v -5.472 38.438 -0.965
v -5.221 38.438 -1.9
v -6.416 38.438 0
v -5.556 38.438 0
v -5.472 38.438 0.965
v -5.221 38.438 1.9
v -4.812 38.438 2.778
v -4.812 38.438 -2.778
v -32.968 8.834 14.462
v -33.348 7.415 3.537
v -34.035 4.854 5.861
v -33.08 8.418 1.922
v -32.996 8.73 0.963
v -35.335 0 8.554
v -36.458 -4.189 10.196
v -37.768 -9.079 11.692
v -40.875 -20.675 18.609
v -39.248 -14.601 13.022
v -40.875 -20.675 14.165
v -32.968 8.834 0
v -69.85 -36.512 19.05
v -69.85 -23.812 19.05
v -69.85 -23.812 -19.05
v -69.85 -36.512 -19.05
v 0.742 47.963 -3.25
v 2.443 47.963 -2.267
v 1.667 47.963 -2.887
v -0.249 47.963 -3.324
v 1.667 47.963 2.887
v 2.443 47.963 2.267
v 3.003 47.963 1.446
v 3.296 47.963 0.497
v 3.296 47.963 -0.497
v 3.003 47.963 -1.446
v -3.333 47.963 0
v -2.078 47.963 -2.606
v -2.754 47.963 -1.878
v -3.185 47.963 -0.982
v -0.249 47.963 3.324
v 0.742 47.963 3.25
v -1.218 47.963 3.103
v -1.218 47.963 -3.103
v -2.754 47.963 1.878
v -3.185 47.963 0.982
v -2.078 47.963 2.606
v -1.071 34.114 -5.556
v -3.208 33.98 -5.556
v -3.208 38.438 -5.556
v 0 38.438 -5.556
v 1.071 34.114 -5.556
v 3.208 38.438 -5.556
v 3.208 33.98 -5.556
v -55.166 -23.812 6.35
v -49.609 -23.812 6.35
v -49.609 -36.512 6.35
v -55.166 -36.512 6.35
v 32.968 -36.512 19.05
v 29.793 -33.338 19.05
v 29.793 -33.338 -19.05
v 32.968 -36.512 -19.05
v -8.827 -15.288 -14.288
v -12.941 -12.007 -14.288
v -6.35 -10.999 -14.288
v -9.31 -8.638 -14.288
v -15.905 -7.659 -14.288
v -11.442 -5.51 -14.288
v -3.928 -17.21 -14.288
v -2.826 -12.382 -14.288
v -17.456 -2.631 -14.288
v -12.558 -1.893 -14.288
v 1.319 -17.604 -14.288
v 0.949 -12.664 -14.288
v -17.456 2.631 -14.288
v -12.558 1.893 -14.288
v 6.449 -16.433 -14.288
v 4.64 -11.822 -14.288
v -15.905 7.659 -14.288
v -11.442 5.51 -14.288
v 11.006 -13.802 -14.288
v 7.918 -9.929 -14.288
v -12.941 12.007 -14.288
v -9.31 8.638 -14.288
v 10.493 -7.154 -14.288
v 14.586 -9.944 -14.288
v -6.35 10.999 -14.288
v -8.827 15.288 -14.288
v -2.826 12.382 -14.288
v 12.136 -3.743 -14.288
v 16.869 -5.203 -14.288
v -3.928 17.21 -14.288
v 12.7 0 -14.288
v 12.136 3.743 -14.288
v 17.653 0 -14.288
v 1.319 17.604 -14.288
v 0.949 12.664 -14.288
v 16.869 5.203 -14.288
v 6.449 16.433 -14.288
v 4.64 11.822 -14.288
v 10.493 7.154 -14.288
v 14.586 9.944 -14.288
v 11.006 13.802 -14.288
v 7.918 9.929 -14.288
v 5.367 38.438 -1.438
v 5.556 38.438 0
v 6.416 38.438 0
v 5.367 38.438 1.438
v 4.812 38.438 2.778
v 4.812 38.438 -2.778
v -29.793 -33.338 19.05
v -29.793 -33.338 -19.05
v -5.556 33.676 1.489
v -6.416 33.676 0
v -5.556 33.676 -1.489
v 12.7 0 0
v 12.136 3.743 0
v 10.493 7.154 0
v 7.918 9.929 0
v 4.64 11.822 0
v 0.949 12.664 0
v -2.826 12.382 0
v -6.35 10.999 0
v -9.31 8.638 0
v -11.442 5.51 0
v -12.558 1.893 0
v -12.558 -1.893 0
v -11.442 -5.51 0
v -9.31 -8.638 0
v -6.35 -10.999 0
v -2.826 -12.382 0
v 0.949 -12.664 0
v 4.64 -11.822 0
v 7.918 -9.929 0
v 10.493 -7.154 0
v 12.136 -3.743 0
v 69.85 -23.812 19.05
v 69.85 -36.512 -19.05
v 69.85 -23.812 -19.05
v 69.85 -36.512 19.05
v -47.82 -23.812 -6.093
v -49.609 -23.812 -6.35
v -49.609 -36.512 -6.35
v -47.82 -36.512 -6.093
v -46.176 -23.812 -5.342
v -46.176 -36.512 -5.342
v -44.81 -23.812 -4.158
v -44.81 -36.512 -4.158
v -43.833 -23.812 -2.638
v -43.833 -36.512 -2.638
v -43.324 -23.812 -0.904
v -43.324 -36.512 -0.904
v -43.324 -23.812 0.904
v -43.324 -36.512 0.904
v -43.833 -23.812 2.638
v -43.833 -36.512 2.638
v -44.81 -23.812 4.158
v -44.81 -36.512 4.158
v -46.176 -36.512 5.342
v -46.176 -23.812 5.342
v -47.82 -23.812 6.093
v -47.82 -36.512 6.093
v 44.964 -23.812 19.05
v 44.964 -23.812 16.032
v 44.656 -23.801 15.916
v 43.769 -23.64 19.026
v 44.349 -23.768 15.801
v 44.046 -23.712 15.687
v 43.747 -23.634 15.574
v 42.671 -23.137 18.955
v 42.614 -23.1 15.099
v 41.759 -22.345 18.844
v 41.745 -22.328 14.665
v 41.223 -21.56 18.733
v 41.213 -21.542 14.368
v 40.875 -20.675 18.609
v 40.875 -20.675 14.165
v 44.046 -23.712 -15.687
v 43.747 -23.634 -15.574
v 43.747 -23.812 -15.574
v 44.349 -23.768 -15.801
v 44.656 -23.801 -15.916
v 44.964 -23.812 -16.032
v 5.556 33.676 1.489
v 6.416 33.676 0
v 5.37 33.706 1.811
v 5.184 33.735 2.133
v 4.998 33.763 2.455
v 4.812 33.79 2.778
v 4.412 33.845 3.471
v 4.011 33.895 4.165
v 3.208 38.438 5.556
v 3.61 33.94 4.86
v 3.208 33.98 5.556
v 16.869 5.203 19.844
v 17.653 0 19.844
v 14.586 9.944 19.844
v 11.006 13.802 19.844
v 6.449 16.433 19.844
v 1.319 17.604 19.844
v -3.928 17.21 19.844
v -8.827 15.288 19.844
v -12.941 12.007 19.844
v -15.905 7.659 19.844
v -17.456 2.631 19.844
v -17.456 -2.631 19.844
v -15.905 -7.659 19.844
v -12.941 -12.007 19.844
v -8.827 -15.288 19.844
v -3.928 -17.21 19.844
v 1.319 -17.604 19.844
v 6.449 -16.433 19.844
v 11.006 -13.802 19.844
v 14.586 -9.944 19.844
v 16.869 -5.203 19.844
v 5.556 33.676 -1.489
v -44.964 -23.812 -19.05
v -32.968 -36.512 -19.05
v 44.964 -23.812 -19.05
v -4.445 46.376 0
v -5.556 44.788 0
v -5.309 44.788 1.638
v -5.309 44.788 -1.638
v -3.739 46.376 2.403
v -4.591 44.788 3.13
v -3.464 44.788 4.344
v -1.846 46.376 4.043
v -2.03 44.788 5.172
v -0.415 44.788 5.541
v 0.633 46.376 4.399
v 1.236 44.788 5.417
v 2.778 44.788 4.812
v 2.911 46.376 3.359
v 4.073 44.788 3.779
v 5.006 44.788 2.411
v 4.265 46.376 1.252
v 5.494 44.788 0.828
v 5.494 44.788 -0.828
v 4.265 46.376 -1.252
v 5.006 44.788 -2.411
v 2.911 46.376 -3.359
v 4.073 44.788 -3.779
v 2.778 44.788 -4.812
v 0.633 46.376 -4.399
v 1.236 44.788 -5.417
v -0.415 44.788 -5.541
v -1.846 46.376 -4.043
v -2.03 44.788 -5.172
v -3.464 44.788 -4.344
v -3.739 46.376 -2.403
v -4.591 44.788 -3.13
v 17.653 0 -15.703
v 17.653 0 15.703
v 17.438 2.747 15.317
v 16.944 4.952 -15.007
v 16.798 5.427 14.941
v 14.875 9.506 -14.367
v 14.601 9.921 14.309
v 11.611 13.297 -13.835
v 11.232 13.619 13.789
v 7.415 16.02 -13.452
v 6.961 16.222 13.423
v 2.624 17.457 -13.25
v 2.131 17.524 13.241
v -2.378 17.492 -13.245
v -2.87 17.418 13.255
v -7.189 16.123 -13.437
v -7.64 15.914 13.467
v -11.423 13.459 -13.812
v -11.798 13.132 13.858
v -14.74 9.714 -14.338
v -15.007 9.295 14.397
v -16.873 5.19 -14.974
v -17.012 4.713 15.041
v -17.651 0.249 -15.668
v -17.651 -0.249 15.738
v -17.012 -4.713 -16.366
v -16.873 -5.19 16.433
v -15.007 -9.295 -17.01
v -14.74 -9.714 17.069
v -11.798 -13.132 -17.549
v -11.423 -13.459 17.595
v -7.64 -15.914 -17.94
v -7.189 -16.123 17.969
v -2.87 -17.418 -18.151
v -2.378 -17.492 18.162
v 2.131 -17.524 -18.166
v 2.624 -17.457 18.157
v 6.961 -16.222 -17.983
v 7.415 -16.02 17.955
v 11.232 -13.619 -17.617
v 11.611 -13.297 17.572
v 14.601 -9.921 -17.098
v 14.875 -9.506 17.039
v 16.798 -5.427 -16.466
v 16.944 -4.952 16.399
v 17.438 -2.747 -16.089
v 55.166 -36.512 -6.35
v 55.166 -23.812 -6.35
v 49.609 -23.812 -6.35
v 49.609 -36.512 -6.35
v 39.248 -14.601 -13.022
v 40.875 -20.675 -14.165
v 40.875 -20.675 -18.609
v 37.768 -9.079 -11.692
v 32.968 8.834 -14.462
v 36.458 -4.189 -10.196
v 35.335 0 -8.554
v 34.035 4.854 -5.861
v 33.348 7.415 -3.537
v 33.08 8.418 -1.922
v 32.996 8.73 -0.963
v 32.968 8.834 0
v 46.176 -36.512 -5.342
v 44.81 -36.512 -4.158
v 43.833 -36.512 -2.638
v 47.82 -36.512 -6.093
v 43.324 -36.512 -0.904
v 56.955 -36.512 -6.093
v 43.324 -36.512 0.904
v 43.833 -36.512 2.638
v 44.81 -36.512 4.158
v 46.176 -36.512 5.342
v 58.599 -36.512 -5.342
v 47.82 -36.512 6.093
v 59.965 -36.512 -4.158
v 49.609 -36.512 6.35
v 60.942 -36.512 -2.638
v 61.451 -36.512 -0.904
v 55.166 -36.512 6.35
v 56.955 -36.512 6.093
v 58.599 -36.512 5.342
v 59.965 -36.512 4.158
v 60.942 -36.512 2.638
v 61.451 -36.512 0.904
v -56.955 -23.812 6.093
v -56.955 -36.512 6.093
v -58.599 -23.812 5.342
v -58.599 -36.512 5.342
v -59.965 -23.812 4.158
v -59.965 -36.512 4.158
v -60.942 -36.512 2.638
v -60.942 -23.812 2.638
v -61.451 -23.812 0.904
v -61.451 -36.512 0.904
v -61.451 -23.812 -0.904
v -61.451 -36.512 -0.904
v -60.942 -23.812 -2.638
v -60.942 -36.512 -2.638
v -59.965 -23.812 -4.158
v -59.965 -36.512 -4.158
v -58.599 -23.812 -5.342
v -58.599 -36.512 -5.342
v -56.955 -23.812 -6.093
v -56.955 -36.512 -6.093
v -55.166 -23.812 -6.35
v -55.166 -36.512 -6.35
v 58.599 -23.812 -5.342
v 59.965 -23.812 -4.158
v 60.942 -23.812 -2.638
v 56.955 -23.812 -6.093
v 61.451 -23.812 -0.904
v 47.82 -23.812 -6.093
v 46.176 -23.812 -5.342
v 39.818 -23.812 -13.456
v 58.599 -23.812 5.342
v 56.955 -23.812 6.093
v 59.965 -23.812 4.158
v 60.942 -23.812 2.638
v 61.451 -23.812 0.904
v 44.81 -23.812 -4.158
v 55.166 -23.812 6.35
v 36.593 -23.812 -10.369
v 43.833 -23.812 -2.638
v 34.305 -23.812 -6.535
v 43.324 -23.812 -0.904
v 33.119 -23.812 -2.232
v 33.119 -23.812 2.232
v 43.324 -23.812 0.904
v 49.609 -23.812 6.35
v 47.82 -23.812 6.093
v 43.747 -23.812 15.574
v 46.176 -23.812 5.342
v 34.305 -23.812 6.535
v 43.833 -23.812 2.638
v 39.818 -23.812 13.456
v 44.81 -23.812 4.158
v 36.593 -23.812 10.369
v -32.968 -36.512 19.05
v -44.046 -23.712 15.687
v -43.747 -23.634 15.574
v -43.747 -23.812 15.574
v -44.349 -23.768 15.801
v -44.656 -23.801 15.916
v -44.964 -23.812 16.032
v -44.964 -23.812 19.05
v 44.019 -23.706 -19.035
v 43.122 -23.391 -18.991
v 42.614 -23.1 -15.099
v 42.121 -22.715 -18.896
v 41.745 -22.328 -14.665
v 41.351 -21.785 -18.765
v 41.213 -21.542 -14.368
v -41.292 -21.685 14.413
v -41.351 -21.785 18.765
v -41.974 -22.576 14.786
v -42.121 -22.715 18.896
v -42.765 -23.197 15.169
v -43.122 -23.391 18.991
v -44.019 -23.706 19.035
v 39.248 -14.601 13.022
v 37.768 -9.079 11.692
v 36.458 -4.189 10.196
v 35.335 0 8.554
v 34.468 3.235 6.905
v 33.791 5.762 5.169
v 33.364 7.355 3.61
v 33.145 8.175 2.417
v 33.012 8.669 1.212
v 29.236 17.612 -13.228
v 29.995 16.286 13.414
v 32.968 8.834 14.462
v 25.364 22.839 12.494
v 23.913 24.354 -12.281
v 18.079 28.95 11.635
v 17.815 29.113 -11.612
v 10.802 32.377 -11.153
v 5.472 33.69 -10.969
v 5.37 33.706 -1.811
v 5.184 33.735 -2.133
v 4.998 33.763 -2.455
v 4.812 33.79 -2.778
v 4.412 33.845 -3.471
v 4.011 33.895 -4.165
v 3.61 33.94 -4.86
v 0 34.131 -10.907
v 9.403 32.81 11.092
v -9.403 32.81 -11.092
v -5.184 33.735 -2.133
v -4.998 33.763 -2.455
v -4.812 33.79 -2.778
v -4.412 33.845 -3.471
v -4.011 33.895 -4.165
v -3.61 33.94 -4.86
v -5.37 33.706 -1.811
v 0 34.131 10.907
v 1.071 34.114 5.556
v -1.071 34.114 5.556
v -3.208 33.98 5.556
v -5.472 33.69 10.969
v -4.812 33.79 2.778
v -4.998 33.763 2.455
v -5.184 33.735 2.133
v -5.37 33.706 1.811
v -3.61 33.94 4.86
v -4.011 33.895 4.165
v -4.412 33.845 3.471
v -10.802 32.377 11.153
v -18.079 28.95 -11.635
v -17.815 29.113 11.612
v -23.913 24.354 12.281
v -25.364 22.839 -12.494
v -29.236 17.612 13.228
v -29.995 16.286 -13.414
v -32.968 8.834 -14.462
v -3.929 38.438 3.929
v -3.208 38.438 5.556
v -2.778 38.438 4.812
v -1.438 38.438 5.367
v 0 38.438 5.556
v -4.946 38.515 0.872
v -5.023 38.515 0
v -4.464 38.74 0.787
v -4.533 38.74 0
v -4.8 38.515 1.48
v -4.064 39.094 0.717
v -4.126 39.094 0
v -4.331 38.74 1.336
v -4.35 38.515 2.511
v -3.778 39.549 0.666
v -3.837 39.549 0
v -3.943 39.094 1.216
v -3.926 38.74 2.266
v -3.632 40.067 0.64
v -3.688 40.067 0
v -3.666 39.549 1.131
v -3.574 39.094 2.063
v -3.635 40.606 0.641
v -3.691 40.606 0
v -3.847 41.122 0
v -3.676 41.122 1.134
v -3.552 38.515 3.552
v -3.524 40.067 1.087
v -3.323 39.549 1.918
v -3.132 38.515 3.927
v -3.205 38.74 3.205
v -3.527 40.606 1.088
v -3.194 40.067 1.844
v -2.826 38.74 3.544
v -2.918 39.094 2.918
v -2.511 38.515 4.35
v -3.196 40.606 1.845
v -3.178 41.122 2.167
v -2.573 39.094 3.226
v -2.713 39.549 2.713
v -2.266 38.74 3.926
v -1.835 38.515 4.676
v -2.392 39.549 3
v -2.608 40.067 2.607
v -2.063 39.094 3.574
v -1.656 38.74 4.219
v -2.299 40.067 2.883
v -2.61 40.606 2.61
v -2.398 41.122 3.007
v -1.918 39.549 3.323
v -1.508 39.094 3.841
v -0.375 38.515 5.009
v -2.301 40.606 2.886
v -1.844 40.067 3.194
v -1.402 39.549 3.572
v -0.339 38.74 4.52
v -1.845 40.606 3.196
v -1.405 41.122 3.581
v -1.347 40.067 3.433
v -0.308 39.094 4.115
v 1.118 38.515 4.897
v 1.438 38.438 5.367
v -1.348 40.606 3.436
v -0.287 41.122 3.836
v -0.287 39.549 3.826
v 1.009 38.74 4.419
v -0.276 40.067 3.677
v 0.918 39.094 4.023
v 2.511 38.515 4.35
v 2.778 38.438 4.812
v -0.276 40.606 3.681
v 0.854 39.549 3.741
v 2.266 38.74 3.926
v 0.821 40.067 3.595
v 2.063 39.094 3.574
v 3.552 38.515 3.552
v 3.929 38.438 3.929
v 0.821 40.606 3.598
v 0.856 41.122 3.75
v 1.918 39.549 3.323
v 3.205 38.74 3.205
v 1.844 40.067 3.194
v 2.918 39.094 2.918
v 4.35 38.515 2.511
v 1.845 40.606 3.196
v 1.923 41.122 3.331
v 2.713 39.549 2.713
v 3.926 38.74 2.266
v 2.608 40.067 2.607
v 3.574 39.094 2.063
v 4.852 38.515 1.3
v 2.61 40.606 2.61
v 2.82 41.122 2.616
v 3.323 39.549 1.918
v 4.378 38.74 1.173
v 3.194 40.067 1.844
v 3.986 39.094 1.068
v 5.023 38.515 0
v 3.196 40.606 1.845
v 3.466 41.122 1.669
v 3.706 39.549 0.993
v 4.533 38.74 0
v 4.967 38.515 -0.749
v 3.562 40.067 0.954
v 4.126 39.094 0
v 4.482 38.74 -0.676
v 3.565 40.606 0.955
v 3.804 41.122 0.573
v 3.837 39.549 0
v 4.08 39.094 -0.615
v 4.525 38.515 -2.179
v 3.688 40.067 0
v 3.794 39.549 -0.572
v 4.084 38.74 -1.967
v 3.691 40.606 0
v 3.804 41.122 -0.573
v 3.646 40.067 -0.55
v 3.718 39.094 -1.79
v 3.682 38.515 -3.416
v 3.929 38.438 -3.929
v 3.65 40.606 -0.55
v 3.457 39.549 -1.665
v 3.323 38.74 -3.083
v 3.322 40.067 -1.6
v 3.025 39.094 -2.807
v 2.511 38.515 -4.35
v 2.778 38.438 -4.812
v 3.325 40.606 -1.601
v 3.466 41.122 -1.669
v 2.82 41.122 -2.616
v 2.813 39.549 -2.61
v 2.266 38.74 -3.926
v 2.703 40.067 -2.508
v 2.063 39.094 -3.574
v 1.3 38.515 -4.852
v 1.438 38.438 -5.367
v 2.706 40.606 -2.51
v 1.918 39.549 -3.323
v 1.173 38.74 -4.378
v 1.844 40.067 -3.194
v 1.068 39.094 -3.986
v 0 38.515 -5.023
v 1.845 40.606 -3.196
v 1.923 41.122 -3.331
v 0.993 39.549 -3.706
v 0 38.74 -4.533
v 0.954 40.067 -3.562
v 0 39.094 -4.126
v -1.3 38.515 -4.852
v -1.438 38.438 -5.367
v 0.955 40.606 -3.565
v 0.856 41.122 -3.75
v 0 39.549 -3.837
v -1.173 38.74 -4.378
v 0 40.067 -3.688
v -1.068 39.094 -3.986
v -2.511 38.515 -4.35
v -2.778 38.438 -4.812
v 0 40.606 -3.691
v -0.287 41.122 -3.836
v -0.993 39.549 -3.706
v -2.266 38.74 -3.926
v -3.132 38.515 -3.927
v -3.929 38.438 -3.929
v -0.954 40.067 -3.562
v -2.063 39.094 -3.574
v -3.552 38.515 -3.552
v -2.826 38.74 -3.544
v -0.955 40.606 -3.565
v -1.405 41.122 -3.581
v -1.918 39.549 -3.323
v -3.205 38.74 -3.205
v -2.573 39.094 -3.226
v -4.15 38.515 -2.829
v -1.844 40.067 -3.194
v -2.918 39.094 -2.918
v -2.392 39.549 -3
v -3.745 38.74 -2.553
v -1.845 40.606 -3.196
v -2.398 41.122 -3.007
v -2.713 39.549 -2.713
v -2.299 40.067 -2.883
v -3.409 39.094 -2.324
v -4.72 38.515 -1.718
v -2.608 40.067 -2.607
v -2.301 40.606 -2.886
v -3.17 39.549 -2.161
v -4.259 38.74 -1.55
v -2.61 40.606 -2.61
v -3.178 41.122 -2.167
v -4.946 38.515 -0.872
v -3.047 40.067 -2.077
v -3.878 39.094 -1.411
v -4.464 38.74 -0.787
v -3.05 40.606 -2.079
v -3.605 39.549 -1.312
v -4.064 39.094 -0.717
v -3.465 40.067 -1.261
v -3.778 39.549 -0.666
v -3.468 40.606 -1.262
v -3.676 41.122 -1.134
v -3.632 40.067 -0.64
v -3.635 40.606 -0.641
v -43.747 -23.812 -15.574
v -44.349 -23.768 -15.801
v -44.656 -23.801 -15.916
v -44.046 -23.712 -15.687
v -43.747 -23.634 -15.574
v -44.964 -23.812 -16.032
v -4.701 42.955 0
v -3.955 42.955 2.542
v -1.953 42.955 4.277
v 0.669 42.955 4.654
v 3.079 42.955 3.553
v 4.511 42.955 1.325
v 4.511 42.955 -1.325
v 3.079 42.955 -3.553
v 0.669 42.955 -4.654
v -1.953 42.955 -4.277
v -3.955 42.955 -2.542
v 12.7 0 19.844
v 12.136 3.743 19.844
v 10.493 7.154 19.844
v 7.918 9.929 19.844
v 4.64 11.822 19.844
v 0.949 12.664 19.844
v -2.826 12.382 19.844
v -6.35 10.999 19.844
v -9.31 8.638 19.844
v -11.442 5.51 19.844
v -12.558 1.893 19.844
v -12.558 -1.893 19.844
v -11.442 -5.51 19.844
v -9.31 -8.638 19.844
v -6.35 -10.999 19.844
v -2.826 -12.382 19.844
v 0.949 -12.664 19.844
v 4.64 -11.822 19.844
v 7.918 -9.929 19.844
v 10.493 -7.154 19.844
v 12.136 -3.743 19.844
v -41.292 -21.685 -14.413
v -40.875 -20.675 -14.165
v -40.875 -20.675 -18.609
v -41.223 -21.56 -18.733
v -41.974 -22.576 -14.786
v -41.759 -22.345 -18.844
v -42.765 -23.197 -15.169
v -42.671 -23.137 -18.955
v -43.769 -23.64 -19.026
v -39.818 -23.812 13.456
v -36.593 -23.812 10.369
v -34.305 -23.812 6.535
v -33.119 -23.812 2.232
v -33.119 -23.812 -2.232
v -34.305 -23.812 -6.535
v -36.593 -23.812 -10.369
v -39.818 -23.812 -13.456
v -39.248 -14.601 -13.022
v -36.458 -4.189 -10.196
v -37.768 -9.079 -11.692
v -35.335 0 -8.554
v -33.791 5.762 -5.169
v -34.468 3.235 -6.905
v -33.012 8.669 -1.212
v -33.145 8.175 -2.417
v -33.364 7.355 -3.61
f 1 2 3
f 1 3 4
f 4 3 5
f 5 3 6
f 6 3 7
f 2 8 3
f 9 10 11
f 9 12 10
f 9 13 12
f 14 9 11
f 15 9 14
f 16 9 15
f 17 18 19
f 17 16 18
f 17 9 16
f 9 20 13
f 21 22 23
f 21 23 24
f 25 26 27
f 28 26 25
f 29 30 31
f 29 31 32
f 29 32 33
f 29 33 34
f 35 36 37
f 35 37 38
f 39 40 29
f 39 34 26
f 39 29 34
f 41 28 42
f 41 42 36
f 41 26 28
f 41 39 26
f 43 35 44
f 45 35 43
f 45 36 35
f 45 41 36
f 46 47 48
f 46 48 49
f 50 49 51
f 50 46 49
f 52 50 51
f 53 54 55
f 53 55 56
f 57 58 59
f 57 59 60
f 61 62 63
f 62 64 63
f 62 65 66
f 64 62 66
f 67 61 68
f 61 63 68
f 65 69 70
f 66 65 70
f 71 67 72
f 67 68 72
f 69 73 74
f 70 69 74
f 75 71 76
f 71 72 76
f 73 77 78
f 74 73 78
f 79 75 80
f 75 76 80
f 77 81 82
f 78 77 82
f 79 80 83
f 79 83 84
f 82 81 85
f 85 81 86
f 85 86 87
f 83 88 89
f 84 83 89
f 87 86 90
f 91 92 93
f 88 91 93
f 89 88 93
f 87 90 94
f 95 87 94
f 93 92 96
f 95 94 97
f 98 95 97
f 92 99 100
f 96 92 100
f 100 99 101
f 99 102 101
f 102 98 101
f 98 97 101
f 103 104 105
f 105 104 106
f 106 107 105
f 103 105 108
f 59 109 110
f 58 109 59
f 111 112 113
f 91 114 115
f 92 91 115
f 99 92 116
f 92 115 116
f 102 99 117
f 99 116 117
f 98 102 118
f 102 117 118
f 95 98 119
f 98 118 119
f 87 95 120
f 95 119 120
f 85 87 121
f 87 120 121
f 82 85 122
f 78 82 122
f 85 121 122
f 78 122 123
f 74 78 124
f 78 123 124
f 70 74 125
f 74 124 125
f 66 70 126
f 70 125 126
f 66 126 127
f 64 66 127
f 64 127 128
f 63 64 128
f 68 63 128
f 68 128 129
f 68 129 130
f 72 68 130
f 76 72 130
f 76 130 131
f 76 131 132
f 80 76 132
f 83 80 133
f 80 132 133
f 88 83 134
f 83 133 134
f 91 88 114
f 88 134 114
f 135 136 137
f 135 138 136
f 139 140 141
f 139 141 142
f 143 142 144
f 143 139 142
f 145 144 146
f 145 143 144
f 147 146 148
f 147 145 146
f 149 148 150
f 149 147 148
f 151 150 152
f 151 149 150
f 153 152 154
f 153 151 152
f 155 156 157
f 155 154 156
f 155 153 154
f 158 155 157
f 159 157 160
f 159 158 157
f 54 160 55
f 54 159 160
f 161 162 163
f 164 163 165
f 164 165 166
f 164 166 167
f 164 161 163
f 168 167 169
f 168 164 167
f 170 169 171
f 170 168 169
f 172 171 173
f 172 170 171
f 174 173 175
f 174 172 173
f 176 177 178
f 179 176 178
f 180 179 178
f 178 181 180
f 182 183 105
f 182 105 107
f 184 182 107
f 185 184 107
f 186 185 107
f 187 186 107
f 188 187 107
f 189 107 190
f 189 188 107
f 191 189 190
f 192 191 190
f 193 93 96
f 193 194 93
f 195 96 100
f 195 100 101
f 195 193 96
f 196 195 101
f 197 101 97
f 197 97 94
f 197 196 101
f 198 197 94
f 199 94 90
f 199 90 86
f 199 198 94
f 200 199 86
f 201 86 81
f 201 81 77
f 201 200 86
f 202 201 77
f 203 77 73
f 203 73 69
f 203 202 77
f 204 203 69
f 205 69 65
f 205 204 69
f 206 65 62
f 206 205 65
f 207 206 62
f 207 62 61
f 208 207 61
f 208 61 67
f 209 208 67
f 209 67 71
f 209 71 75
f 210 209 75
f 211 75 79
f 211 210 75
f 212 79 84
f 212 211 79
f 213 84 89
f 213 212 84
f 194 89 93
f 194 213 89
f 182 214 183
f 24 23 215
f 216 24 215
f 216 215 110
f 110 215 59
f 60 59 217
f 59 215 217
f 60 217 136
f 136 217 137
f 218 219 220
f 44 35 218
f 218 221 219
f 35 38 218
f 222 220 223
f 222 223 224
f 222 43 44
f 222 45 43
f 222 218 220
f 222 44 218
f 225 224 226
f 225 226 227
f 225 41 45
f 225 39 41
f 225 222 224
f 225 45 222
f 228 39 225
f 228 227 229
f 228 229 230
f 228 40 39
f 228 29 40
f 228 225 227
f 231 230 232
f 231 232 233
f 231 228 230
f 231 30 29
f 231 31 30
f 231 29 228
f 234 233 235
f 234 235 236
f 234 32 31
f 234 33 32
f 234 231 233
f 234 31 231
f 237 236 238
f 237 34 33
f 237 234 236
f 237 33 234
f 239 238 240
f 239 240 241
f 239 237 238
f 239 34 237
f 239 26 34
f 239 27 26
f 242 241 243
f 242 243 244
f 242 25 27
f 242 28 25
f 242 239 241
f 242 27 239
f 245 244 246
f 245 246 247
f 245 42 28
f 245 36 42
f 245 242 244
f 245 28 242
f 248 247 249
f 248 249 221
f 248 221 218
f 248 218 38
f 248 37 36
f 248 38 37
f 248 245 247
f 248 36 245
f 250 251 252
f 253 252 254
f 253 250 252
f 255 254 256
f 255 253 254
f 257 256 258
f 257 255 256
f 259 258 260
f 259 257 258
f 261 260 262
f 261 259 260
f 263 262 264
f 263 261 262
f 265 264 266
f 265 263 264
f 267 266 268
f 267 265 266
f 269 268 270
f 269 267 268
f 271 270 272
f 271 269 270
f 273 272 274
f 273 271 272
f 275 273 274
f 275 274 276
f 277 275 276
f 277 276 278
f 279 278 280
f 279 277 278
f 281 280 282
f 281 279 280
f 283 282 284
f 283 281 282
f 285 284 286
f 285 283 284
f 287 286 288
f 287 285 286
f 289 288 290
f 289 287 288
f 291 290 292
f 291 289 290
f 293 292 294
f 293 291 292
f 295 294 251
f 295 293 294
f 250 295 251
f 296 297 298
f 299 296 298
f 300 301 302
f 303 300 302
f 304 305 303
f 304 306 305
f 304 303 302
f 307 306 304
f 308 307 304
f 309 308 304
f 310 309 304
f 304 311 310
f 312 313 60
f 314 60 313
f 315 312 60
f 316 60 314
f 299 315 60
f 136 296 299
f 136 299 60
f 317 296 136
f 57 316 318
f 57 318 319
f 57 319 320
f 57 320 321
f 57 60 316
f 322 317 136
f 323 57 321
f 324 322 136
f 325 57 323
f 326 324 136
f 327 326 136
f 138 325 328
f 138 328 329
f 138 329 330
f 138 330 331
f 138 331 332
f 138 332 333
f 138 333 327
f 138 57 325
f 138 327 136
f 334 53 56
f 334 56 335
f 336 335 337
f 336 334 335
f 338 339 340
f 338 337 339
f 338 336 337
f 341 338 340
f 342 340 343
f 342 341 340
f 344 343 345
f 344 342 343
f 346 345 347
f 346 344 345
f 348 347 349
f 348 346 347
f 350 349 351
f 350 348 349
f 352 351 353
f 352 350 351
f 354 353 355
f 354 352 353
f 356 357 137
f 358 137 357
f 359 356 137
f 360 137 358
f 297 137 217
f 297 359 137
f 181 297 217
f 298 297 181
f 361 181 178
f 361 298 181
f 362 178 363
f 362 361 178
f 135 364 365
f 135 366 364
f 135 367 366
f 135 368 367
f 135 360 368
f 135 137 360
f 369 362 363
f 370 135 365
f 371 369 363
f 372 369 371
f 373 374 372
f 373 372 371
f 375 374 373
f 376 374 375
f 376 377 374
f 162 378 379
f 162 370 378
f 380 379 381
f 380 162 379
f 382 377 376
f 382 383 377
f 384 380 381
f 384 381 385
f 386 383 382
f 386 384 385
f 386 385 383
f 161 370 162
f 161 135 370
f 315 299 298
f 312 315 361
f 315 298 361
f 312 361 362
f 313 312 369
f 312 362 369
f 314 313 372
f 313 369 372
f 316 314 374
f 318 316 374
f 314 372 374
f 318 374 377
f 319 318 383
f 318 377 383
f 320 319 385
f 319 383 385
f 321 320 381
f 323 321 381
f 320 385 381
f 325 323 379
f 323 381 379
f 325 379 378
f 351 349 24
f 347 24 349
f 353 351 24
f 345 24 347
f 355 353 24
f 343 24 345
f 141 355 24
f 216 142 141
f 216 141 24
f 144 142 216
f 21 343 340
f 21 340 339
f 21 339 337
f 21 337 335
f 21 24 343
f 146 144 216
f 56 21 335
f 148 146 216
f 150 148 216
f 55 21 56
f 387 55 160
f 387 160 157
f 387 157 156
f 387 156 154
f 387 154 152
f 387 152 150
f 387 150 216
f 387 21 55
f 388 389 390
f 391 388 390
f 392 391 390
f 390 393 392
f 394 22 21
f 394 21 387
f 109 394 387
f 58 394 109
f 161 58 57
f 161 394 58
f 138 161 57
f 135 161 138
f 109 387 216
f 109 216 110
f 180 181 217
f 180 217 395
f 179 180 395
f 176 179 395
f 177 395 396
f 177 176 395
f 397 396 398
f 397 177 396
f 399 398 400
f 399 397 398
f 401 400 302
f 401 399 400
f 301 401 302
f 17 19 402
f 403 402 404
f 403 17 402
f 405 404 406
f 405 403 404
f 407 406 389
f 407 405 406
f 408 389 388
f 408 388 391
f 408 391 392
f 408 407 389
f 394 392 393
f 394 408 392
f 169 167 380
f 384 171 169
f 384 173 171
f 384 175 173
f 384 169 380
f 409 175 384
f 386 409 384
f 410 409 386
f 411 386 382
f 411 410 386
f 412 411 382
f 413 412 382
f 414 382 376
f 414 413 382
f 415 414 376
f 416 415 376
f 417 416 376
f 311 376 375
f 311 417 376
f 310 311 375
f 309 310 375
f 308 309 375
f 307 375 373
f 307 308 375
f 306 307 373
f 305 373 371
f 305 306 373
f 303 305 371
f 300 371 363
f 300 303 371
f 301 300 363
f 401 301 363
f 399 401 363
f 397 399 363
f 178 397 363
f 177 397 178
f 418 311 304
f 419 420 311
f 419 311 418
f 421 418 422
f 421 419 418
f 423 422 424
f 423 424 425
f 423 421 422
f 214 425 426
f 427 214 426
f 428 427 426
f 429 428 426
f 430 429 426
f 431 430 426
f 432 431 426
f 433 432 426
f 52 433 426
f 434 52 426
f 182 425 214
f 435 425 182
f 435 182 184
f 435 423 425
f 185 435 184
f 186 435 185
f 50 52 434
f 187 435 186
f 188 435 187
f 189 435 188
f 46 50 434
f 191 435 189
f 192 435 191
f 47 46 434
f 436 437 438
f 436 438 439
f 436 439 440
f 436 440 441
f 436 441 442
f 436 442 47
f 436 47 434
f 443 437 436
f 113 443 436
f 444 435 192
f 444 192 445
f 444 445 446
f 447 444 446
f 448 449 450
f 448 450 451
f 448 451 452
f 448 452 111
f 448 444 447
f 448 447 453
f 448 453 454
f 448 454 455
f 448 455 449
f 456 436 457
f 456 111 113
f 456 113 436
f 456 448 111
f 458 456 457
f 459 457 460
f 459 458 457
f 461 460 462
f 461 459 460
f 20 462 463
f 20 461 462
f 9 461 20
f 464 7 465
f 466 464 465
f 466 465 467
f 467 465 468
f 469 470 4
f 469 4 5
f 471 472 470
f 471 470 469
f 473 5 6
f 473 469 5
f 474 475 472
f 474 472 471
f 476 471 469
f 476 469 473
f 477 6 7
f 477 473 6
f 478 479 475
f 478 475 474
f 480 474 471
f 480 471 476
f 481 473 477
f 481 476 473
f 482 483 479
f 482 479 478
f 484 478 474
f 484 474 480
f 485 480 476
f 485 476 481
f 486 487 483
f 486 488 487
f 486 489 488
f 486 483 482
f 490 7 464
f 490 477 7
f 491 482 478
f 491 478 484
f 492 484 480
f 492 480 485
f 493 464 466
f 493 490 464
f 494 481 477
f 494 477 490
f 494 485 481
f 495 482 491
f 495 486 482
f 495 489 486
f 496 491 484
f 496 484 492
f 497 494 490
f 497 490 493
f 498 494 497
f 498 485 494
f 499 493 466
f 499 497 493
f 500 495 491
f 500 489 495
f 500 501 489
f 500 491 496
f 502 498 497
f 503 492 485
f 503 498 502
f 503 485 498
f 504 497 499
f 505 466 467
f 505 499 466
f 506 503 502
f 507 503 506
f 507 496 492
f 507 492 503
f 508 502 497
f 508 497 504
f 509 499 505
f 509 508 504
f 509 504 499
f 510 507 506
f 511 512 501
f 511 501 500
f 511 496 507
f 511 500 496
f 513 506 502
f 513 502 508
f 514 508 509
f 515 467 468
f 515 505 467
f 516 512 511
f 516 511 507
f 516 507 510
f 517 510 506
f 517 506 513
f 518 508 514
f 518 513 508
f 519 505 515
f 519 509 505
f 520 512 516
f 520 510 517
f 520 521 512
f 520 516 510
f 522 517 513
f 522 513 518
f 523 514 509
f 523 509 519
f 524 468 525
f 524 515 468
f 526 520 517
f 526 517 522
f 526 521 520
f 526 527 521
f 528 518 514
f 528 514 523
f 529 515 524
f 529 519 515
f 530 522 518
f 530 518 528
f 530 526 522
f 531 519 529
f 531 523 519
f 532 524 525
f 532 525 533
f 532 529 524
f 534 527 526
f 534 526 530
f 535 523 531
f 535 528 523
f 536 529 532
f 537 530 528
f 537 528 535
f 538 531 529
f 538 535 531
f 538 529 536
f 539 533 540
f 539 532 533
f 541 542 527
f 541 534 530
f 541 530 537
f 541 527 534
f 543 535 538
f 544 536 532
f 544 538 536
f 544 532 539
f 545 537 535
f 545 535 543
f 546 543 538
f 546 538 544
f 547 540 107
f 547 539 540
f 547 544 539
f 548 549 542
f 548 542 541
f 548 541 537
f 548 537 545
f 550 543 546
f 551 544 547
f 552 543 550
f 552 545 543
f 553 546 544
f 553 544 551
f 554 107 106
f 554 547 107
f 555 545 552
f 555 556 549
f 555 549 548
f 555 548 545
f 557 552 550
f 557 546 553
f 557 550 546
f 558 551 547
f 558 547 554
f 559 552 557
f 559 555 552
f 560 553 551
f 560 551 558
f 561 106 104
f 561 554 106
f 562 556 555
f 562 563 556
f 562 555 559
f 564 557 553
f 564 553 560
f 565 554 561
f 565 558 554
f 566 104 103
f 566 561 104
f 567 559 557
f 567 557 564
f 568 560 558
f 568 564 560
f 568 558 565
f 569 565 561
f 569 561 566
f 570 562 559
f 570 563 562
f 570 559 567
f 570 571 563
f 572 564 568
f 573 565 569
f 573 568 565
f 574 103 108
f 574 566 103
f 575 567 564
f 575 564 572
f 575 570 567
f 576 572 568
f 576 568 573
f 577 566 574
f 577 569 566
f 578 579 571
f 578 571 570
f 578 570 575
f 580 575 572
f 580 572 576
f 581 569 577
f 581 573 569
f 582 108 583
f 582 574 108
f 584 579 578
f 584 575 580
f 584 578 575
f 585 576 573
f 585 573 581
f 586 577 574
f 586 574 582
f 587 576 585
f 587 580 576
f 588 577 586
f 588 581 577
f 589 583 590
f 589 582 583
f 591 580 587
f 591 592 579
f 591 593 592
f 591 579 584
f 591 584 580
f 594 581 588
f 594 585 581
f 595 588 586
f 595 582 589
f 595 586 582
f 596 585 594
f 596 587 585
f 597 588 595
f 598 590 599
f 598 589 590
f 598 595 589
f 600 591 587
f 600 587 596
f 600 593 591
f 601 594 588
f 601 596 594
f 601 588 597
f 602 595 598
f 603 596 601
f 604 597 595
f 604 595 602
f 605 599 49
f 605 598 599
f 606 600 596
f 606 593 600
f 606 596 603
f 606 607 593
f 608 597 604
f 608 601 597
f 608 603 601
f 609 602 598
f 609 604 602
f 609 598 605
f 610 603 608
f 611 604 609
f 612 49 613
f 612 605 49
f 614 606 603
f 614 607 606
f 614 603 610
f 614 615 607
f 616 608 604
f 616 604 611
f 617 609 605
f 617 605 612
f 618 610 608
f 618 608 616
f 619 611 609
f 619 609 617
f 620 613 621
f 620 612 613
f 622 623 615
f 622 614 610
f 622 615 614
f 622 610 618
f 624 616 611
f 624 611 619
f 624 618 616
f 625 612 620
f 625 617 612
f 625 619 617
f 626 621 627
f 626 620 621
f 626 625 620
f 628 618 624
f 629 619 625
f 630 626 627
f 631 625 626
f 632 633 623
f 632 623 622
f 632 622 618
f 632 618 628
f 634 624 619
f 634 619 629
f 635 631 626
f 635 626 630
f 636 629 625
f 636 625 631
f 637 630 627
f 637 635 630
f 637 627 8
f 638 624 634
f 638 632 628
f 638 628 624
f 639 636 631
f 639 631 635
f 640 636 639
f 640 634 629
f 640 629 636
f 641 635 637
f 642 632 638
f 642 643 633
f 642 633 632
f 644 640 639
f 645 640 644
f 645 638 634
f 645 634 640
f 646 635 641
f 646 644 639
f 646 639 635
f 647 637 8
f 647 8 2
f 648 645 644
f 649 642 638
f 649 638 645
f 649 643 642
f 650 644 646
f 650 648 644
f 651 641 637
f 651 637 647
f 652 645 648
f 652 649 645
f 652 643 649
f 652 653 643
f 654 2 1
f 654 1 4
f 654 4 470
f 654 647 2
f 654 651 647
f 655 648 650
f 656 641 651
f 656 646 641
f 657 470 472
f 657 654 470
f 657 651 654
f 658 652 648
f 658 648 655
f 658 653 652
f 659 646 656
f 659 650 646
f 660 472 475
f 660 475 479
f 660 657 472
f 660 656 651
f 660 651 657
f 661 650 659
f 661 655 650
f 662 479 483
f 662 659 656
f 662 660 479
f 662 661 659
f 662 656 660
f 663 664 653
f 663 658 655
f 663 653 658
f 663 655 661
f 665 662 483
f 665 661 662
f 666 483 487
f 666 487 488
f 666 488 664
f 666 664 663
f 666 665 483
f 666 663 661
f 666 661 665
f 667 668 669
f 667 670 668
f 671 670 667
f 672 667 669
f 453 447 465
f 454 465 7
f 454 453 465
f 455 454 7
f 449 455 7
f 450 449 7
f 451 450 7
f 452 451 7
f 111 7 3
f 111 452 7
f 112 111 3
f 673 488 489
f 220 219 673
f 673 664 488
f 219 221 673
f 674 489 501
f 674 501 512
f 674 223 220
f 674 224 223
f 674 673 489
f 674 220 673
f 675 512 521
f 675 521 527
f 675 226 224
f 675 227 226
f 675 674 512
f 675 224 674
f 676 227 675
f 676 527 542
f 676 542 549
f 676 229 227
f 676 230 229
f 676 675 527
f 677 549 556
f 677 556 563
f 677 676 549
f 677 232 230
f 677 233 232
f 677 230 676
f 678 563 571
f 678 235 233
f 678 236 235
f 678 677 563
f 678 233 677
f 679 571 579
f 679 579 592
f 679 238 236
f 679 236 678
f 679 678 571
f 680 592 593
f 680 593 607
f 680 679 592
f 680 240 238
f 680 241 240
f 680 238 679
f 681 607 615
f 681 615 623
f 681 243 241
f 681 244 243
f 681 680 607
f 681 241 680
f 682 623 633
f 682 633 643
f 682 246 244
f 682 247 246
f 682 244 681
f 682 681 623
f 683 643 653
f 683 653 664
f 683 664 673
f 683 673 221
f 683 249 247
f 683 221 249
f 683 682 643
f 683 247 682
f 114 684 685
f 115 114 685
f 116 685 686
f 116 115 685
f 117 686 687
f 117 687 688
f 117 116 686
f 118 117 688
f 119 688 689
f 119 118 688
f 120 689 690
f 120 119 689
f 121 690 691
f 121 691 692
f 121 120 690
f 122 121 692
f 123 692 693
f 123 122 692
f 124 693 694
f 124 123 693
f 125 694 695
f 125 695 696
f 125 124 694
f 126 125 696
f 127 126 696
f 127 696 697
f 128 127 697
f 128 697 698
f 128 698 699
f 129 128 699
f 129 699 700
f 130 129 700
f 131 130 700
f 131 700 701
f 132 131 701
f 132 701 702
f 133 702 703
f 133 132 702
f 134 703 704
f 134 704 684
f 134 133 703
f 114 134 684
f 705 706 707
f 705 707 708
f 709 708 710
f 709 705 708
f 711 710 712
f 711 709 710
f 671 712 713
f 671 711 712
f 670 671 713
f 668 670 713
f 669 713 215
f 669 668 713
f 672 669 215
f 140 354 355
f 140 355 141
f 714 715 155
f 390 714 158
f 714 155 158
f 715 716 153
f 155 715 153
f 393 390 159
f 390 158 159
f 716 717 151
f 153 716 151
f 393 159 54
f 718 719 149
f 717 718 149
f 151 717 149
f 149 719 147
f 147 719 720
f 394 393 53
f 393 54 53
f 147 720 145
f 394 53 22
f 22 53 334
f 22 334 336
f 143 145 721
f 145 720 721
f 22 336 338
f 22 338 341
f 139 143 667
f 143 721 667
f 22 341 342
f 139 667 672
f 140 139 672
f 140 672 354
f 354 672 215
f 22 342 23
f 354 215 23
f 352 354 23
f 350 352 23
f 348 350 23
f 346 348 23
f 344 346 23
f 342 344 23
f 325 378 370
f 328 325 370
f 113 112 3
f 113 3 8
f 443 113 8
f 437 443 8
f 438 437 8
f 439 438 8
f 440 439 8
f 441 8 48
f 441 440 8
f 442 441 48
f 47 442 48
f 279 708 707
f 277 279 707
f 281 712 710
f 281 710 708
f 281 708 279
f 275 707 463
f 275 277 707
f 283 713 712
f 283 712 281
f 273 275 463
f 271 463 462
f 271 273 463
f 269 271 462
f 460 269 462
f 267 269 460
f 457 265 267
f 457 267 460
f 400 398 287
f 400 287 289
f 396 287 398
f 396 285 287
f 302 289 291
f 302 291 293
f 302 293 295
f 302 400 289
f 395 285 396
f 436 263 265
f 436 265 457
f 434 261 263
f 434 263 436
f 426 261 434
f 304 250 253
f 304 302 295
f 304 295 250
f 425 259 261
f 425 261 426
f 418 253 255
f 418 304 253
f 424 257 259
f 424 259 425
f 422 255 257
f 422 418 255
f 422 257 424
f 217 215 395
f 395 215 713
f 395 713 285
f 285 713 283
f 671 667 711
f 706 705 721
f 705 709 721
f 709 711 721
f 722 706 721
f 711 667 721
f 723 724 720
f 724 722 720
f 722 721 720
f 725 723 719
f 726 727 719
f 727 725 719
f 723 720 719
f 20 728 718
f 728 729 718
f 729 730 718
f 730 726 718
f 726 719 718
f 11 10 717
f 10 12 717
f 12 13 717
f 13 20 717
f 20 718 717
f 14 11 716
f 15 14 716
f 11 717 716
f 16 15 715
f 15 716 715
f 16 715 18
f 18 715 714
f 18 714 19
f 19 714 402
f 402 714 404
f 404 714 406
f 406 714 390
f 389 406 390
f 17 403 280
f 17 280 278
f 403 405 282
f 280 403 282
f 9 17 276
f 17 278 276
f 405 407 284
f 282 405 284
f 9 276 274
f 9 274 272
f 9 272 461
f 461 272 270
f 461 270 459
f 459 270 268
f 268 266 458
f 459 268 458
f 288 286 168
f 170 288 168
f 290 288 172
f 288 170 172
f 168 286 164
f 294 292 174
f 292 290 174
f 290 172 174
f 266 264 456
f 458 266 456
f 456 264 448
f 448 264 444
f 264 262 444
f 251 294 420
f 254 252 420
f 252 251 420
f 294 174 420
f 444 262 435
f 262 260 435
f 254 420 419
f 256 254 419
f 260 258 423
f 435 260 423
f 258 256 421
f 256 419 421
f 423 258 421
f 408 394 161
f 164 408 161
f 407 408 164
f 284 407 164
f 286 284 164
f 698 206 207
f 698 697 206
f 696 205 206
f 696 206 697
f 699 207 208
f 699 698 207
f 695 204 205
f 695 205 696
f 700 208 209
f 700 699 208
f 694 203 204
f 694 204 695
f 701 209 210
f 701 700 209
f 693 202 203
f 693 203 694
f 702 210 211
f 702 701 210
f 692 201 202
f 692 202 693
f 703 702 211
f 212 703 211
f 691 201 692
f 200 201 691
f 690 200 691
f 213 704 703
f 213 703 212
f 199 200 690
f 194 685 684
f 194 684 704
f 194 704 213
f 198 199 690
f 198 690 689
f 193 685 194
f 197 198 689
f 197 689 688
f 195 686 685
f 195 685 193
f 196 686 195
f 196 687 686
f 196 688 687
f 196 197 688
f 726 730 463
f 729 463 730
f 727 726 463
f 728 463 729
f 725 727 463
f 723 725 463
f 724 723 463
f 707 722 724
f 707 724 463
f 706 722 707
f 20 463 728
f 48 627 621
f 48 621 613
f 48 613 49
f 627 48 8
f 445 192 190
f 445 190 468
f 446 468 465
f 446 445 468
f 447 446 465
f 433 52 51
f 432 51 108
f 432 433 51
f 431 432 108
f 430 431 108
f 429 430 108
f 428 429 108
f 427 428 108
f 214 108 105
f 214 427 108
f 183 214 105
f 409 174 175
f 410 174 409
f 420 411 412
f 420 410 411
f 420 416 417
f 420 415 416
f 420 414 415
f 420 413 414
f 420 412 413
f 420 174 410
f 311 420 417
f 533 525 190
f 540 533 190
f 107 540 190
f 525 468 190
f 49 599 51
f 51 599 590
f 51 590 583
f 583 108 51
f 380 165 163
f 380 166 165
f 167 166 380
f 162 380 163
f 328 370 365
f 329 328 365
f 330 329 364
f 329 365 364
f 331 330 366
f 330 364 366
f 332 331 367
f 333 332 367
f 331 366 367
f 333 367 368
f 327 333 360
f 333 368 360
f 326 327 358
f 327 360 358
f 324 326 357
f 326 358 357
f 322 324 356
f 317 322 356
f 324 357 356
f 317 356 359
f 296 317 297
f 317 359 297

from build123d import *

# Parameters (mm, degrees)
SKETCH1_R               = 17.653
SKETCH1_R_2             = 12.7
EXTRUDE1_DEPTH          = 19.84375
EXTRUDE1_DEPTH_BACK     = 14.2875
SKETCH2_R               = 17.653
EXTRUDE2_DEPTH          = 19.05
CUT_EXTRUDE1_DEPTH      = 35.13125
CUT_EXTRUDE1_DEPTH_BACK = 37.5125
CUT_EXTRUDE2_DEPTH      = 35.13125
CUT_EXTRUDE2_DEPTH_BACK = 23.8125
CUT_EXTRUDE3_DEPTH      = 70.85
EXTRUDE3_DEPTH          = 4.7625


with BuildPart() as part:
    # Sketch1 → Extrude1 (new body, two sides)
    with BuildSketch(Plane.XY) as extrude1_sk:
        Circle(SKETCH1_R)
        Circle(SKETCH1_R_2, mode=Mode.SUBTRACT)
    extrude(amount=EXTRUDE1_DEPTH)
    extrude(extrude1_sk.sketch, amount=-EXTRUDE1_DEPTH_BACK)


with BuildPart() as body_2:
    # Sketch2 → Extrude2 (new body, symmetric)
    with BuildSketch(Plane.XY):
        with BuildLine():
            Line((-32.968255859, 8.833817533), (-40.875075195, -20.674833958))
            ThreePointArc((-40.875075195, -20.674833958), (-42.387071144, -22.937695807), (-44.964161193, -23.8125))
            Line((-44.964161193, -23.8125), (-69.85, -23.8125))
            Line((-69.85, -23.8125), (-69.85, -36.5125))
            Line((-69.85, -36.5125), (-32.968255859, -36.5125))
            Line((-32.968255859, -36.5125), (-29.793255859, -33.3375))
            Line((-29.793255859, -33.3375), (29.793255859, -33.3375))
            Line((29.793255859, -33.3375), (32.968255859, -36.5125))
            Line((32.968255859, -36.5125), (69.85, -36.5125))
            Line((69.85, -36.5125), (69.85, -23.8125))
            Line((69.85, -23.8125), (44.964161193, -23.8125))
            ThreePointArc((44.964161193, -23.8125), (42.387071144, -22.937695807), (40.875075195, -20.674833958))
            Line((40.875075195, -20.674833958), (32.968255859, 8.833817533))
            ThreePointArc((32.968255859, 8.833817533), (0, 34.13125), (-32.968255859, 8.833817533))
        make_face()
        Circle(SKETCH2_R, mode=Mode.SUBTRACT)
    extrude(amount=EXTRUDE2_DEPTH, both=True)

    # Sketch3 → Cut-Extrude1 (cut, two sides)
    with BuildSketch(Plane(origin=(0, 0, 0), x_dir=(1, 0, 0), z_dir=(0, 1, 0))) as cut_extrude1_sk:
        with BuildLine():
            Line((-55.165625, 6.35), (-49.609375, 6.35))
            ThreePointArc((-49.609375, 6.35), (-43.259375, 0), (-49.609375, -6.35))
            Line((-49.609375, -6.35), (-55.165625, -6.35))
            ThreePointArc((-55.165625, -6.35), (-61.515625, 0), (-55.165625, 6.35))
        make_face()
        with BuildLine():
            Line((49.609375, -6.35), (55.165625, -6.35))
            ThreePointArc((55.165625, -6.35), (61.515625, 0), (55.165625, 6.35))
            Line((55.165625, 6.35), (49.609375, 6.35))
            ThreePointArc((49.609375, 6.35), (43.259375, 0), (49.609375, -6.35))
        make_face()
    extrude(amount=CUT_EXTRUDE1_DEPTH, mode=Mode.SUBTRACT)
    extrude(cut_extrude1_sk.sketch, amount=-CUT_EXTRUDE1_DEPTH_BACK, mode=Mode.SUBTRACT)

    # Sketch4 → Cut-Extrude2 (cut, two sides)
    with BuildSketch(Plane(origin=(0, 0, 0), x_dir=(1, 0, 0), z_dir=(0, 1, 0))) as cut_extrude2_sk:
        with BuildLine():
            Line((43.746908834, 15.574284469), (69.85, 25.4))
            Line((69.85, 25.4), (69.85, -25.4))
            Line((69.85, -25.4), (43.746908834, -15.574284469))
            ThreePointArc((43.746908834, -15.574284469), (32.968255859, 0), (43.746908834, 15.574284469))
        make_face()
        with BuildLine():
            Line((-43.746908834, -15.574284469), (-69.85, -25.4))
            Line((-69.85, -25.4), (-69.85, 25.4))
            Line((-69.85, 25.4), (-43.746908834, 15.574284469))
            ThreePointArc((-43.746908834, 15.574284469), (-32.968255859, 0), (-43.746908834, -15.574284469))
        make_face()
    extrude(amount=CUT_EXTRUDE2_DEPTH, mode=Mode.SUBTRACT)
    extrude(cut_extrude2_sk.sketch, amount=-CUT_EXTRUDE2_DEPTH_BACK, mode=Mode.SUBTRACT)

    # Sketch5 → Cut-Extrude3 (cut, symmetric)
    with BuildSketch(Plane(origin=(0, 0, 0), x_dir=(0, 0, -1), z_dir=(1, 0, 0))):
        Polygon((-19.05, -23.8125), (-10.906537009, 34.13125), (-19.05, 34.13125), align=None)
    cut_extrude3 = extrude(amount=CUT_EXTRUDE3_DEPTH, both=True, mode=Mode.SUBTRACT)

    # Mirror1: Cut-Extrude3 across plane
    add(cut_extrude3.mirror(Plane.XY), mode=Mode.SUBTRACT)



with BuildPart() as body_3:
    # Sketch6 → Revolve1 (revolve)
    with BuildSketch(Plane.XY):
        with BuildLine():
            Line((0, 33.675960454), (-5.55625, 33.675960454))
            Line((-5.55625, 33.675960454), (-5.55625, 38.438460454))
            ThreePointArc((-5.55625, 38.438460454), (-3.965277045, 39.311298106), (-3.846591708, 41.122086416))
            Line((-3.846591708, 41.122086416), (-5.55625, 44.788460454))
            Line((-5.55625, 44.788460454), (-3.333091066, 47.963460454))
            Line((-3.333091066, 47.963460454), (0, 47.963460454))
            Line((0, 47.963460454), (0, 33.675960454))
        make_face()
    revolve(axis=Axis((0, 34.13125, 0), (0, 1, 0)))


with BuildPart() as body_2_1:
    add(body_2.part)

    add(body_3.part)  # Extrude3 merges body 3
    # Sketch7 → Extrude3 (add)
    with BuildSketch(Plane.XZ.offset(-33.675960454)):
        Polygon((-3.207902433, 5.55625), (-6.415804866, 0), (-3.207902433, -5.55625), (3.207902433, -5.55625), (6.415804866, 0), (3.207902433, 5.55625), align=None)
    extrude(amount=-EXTRUDE3_DEPTH)


solid = Compound([part.part, body_2_1.part])
